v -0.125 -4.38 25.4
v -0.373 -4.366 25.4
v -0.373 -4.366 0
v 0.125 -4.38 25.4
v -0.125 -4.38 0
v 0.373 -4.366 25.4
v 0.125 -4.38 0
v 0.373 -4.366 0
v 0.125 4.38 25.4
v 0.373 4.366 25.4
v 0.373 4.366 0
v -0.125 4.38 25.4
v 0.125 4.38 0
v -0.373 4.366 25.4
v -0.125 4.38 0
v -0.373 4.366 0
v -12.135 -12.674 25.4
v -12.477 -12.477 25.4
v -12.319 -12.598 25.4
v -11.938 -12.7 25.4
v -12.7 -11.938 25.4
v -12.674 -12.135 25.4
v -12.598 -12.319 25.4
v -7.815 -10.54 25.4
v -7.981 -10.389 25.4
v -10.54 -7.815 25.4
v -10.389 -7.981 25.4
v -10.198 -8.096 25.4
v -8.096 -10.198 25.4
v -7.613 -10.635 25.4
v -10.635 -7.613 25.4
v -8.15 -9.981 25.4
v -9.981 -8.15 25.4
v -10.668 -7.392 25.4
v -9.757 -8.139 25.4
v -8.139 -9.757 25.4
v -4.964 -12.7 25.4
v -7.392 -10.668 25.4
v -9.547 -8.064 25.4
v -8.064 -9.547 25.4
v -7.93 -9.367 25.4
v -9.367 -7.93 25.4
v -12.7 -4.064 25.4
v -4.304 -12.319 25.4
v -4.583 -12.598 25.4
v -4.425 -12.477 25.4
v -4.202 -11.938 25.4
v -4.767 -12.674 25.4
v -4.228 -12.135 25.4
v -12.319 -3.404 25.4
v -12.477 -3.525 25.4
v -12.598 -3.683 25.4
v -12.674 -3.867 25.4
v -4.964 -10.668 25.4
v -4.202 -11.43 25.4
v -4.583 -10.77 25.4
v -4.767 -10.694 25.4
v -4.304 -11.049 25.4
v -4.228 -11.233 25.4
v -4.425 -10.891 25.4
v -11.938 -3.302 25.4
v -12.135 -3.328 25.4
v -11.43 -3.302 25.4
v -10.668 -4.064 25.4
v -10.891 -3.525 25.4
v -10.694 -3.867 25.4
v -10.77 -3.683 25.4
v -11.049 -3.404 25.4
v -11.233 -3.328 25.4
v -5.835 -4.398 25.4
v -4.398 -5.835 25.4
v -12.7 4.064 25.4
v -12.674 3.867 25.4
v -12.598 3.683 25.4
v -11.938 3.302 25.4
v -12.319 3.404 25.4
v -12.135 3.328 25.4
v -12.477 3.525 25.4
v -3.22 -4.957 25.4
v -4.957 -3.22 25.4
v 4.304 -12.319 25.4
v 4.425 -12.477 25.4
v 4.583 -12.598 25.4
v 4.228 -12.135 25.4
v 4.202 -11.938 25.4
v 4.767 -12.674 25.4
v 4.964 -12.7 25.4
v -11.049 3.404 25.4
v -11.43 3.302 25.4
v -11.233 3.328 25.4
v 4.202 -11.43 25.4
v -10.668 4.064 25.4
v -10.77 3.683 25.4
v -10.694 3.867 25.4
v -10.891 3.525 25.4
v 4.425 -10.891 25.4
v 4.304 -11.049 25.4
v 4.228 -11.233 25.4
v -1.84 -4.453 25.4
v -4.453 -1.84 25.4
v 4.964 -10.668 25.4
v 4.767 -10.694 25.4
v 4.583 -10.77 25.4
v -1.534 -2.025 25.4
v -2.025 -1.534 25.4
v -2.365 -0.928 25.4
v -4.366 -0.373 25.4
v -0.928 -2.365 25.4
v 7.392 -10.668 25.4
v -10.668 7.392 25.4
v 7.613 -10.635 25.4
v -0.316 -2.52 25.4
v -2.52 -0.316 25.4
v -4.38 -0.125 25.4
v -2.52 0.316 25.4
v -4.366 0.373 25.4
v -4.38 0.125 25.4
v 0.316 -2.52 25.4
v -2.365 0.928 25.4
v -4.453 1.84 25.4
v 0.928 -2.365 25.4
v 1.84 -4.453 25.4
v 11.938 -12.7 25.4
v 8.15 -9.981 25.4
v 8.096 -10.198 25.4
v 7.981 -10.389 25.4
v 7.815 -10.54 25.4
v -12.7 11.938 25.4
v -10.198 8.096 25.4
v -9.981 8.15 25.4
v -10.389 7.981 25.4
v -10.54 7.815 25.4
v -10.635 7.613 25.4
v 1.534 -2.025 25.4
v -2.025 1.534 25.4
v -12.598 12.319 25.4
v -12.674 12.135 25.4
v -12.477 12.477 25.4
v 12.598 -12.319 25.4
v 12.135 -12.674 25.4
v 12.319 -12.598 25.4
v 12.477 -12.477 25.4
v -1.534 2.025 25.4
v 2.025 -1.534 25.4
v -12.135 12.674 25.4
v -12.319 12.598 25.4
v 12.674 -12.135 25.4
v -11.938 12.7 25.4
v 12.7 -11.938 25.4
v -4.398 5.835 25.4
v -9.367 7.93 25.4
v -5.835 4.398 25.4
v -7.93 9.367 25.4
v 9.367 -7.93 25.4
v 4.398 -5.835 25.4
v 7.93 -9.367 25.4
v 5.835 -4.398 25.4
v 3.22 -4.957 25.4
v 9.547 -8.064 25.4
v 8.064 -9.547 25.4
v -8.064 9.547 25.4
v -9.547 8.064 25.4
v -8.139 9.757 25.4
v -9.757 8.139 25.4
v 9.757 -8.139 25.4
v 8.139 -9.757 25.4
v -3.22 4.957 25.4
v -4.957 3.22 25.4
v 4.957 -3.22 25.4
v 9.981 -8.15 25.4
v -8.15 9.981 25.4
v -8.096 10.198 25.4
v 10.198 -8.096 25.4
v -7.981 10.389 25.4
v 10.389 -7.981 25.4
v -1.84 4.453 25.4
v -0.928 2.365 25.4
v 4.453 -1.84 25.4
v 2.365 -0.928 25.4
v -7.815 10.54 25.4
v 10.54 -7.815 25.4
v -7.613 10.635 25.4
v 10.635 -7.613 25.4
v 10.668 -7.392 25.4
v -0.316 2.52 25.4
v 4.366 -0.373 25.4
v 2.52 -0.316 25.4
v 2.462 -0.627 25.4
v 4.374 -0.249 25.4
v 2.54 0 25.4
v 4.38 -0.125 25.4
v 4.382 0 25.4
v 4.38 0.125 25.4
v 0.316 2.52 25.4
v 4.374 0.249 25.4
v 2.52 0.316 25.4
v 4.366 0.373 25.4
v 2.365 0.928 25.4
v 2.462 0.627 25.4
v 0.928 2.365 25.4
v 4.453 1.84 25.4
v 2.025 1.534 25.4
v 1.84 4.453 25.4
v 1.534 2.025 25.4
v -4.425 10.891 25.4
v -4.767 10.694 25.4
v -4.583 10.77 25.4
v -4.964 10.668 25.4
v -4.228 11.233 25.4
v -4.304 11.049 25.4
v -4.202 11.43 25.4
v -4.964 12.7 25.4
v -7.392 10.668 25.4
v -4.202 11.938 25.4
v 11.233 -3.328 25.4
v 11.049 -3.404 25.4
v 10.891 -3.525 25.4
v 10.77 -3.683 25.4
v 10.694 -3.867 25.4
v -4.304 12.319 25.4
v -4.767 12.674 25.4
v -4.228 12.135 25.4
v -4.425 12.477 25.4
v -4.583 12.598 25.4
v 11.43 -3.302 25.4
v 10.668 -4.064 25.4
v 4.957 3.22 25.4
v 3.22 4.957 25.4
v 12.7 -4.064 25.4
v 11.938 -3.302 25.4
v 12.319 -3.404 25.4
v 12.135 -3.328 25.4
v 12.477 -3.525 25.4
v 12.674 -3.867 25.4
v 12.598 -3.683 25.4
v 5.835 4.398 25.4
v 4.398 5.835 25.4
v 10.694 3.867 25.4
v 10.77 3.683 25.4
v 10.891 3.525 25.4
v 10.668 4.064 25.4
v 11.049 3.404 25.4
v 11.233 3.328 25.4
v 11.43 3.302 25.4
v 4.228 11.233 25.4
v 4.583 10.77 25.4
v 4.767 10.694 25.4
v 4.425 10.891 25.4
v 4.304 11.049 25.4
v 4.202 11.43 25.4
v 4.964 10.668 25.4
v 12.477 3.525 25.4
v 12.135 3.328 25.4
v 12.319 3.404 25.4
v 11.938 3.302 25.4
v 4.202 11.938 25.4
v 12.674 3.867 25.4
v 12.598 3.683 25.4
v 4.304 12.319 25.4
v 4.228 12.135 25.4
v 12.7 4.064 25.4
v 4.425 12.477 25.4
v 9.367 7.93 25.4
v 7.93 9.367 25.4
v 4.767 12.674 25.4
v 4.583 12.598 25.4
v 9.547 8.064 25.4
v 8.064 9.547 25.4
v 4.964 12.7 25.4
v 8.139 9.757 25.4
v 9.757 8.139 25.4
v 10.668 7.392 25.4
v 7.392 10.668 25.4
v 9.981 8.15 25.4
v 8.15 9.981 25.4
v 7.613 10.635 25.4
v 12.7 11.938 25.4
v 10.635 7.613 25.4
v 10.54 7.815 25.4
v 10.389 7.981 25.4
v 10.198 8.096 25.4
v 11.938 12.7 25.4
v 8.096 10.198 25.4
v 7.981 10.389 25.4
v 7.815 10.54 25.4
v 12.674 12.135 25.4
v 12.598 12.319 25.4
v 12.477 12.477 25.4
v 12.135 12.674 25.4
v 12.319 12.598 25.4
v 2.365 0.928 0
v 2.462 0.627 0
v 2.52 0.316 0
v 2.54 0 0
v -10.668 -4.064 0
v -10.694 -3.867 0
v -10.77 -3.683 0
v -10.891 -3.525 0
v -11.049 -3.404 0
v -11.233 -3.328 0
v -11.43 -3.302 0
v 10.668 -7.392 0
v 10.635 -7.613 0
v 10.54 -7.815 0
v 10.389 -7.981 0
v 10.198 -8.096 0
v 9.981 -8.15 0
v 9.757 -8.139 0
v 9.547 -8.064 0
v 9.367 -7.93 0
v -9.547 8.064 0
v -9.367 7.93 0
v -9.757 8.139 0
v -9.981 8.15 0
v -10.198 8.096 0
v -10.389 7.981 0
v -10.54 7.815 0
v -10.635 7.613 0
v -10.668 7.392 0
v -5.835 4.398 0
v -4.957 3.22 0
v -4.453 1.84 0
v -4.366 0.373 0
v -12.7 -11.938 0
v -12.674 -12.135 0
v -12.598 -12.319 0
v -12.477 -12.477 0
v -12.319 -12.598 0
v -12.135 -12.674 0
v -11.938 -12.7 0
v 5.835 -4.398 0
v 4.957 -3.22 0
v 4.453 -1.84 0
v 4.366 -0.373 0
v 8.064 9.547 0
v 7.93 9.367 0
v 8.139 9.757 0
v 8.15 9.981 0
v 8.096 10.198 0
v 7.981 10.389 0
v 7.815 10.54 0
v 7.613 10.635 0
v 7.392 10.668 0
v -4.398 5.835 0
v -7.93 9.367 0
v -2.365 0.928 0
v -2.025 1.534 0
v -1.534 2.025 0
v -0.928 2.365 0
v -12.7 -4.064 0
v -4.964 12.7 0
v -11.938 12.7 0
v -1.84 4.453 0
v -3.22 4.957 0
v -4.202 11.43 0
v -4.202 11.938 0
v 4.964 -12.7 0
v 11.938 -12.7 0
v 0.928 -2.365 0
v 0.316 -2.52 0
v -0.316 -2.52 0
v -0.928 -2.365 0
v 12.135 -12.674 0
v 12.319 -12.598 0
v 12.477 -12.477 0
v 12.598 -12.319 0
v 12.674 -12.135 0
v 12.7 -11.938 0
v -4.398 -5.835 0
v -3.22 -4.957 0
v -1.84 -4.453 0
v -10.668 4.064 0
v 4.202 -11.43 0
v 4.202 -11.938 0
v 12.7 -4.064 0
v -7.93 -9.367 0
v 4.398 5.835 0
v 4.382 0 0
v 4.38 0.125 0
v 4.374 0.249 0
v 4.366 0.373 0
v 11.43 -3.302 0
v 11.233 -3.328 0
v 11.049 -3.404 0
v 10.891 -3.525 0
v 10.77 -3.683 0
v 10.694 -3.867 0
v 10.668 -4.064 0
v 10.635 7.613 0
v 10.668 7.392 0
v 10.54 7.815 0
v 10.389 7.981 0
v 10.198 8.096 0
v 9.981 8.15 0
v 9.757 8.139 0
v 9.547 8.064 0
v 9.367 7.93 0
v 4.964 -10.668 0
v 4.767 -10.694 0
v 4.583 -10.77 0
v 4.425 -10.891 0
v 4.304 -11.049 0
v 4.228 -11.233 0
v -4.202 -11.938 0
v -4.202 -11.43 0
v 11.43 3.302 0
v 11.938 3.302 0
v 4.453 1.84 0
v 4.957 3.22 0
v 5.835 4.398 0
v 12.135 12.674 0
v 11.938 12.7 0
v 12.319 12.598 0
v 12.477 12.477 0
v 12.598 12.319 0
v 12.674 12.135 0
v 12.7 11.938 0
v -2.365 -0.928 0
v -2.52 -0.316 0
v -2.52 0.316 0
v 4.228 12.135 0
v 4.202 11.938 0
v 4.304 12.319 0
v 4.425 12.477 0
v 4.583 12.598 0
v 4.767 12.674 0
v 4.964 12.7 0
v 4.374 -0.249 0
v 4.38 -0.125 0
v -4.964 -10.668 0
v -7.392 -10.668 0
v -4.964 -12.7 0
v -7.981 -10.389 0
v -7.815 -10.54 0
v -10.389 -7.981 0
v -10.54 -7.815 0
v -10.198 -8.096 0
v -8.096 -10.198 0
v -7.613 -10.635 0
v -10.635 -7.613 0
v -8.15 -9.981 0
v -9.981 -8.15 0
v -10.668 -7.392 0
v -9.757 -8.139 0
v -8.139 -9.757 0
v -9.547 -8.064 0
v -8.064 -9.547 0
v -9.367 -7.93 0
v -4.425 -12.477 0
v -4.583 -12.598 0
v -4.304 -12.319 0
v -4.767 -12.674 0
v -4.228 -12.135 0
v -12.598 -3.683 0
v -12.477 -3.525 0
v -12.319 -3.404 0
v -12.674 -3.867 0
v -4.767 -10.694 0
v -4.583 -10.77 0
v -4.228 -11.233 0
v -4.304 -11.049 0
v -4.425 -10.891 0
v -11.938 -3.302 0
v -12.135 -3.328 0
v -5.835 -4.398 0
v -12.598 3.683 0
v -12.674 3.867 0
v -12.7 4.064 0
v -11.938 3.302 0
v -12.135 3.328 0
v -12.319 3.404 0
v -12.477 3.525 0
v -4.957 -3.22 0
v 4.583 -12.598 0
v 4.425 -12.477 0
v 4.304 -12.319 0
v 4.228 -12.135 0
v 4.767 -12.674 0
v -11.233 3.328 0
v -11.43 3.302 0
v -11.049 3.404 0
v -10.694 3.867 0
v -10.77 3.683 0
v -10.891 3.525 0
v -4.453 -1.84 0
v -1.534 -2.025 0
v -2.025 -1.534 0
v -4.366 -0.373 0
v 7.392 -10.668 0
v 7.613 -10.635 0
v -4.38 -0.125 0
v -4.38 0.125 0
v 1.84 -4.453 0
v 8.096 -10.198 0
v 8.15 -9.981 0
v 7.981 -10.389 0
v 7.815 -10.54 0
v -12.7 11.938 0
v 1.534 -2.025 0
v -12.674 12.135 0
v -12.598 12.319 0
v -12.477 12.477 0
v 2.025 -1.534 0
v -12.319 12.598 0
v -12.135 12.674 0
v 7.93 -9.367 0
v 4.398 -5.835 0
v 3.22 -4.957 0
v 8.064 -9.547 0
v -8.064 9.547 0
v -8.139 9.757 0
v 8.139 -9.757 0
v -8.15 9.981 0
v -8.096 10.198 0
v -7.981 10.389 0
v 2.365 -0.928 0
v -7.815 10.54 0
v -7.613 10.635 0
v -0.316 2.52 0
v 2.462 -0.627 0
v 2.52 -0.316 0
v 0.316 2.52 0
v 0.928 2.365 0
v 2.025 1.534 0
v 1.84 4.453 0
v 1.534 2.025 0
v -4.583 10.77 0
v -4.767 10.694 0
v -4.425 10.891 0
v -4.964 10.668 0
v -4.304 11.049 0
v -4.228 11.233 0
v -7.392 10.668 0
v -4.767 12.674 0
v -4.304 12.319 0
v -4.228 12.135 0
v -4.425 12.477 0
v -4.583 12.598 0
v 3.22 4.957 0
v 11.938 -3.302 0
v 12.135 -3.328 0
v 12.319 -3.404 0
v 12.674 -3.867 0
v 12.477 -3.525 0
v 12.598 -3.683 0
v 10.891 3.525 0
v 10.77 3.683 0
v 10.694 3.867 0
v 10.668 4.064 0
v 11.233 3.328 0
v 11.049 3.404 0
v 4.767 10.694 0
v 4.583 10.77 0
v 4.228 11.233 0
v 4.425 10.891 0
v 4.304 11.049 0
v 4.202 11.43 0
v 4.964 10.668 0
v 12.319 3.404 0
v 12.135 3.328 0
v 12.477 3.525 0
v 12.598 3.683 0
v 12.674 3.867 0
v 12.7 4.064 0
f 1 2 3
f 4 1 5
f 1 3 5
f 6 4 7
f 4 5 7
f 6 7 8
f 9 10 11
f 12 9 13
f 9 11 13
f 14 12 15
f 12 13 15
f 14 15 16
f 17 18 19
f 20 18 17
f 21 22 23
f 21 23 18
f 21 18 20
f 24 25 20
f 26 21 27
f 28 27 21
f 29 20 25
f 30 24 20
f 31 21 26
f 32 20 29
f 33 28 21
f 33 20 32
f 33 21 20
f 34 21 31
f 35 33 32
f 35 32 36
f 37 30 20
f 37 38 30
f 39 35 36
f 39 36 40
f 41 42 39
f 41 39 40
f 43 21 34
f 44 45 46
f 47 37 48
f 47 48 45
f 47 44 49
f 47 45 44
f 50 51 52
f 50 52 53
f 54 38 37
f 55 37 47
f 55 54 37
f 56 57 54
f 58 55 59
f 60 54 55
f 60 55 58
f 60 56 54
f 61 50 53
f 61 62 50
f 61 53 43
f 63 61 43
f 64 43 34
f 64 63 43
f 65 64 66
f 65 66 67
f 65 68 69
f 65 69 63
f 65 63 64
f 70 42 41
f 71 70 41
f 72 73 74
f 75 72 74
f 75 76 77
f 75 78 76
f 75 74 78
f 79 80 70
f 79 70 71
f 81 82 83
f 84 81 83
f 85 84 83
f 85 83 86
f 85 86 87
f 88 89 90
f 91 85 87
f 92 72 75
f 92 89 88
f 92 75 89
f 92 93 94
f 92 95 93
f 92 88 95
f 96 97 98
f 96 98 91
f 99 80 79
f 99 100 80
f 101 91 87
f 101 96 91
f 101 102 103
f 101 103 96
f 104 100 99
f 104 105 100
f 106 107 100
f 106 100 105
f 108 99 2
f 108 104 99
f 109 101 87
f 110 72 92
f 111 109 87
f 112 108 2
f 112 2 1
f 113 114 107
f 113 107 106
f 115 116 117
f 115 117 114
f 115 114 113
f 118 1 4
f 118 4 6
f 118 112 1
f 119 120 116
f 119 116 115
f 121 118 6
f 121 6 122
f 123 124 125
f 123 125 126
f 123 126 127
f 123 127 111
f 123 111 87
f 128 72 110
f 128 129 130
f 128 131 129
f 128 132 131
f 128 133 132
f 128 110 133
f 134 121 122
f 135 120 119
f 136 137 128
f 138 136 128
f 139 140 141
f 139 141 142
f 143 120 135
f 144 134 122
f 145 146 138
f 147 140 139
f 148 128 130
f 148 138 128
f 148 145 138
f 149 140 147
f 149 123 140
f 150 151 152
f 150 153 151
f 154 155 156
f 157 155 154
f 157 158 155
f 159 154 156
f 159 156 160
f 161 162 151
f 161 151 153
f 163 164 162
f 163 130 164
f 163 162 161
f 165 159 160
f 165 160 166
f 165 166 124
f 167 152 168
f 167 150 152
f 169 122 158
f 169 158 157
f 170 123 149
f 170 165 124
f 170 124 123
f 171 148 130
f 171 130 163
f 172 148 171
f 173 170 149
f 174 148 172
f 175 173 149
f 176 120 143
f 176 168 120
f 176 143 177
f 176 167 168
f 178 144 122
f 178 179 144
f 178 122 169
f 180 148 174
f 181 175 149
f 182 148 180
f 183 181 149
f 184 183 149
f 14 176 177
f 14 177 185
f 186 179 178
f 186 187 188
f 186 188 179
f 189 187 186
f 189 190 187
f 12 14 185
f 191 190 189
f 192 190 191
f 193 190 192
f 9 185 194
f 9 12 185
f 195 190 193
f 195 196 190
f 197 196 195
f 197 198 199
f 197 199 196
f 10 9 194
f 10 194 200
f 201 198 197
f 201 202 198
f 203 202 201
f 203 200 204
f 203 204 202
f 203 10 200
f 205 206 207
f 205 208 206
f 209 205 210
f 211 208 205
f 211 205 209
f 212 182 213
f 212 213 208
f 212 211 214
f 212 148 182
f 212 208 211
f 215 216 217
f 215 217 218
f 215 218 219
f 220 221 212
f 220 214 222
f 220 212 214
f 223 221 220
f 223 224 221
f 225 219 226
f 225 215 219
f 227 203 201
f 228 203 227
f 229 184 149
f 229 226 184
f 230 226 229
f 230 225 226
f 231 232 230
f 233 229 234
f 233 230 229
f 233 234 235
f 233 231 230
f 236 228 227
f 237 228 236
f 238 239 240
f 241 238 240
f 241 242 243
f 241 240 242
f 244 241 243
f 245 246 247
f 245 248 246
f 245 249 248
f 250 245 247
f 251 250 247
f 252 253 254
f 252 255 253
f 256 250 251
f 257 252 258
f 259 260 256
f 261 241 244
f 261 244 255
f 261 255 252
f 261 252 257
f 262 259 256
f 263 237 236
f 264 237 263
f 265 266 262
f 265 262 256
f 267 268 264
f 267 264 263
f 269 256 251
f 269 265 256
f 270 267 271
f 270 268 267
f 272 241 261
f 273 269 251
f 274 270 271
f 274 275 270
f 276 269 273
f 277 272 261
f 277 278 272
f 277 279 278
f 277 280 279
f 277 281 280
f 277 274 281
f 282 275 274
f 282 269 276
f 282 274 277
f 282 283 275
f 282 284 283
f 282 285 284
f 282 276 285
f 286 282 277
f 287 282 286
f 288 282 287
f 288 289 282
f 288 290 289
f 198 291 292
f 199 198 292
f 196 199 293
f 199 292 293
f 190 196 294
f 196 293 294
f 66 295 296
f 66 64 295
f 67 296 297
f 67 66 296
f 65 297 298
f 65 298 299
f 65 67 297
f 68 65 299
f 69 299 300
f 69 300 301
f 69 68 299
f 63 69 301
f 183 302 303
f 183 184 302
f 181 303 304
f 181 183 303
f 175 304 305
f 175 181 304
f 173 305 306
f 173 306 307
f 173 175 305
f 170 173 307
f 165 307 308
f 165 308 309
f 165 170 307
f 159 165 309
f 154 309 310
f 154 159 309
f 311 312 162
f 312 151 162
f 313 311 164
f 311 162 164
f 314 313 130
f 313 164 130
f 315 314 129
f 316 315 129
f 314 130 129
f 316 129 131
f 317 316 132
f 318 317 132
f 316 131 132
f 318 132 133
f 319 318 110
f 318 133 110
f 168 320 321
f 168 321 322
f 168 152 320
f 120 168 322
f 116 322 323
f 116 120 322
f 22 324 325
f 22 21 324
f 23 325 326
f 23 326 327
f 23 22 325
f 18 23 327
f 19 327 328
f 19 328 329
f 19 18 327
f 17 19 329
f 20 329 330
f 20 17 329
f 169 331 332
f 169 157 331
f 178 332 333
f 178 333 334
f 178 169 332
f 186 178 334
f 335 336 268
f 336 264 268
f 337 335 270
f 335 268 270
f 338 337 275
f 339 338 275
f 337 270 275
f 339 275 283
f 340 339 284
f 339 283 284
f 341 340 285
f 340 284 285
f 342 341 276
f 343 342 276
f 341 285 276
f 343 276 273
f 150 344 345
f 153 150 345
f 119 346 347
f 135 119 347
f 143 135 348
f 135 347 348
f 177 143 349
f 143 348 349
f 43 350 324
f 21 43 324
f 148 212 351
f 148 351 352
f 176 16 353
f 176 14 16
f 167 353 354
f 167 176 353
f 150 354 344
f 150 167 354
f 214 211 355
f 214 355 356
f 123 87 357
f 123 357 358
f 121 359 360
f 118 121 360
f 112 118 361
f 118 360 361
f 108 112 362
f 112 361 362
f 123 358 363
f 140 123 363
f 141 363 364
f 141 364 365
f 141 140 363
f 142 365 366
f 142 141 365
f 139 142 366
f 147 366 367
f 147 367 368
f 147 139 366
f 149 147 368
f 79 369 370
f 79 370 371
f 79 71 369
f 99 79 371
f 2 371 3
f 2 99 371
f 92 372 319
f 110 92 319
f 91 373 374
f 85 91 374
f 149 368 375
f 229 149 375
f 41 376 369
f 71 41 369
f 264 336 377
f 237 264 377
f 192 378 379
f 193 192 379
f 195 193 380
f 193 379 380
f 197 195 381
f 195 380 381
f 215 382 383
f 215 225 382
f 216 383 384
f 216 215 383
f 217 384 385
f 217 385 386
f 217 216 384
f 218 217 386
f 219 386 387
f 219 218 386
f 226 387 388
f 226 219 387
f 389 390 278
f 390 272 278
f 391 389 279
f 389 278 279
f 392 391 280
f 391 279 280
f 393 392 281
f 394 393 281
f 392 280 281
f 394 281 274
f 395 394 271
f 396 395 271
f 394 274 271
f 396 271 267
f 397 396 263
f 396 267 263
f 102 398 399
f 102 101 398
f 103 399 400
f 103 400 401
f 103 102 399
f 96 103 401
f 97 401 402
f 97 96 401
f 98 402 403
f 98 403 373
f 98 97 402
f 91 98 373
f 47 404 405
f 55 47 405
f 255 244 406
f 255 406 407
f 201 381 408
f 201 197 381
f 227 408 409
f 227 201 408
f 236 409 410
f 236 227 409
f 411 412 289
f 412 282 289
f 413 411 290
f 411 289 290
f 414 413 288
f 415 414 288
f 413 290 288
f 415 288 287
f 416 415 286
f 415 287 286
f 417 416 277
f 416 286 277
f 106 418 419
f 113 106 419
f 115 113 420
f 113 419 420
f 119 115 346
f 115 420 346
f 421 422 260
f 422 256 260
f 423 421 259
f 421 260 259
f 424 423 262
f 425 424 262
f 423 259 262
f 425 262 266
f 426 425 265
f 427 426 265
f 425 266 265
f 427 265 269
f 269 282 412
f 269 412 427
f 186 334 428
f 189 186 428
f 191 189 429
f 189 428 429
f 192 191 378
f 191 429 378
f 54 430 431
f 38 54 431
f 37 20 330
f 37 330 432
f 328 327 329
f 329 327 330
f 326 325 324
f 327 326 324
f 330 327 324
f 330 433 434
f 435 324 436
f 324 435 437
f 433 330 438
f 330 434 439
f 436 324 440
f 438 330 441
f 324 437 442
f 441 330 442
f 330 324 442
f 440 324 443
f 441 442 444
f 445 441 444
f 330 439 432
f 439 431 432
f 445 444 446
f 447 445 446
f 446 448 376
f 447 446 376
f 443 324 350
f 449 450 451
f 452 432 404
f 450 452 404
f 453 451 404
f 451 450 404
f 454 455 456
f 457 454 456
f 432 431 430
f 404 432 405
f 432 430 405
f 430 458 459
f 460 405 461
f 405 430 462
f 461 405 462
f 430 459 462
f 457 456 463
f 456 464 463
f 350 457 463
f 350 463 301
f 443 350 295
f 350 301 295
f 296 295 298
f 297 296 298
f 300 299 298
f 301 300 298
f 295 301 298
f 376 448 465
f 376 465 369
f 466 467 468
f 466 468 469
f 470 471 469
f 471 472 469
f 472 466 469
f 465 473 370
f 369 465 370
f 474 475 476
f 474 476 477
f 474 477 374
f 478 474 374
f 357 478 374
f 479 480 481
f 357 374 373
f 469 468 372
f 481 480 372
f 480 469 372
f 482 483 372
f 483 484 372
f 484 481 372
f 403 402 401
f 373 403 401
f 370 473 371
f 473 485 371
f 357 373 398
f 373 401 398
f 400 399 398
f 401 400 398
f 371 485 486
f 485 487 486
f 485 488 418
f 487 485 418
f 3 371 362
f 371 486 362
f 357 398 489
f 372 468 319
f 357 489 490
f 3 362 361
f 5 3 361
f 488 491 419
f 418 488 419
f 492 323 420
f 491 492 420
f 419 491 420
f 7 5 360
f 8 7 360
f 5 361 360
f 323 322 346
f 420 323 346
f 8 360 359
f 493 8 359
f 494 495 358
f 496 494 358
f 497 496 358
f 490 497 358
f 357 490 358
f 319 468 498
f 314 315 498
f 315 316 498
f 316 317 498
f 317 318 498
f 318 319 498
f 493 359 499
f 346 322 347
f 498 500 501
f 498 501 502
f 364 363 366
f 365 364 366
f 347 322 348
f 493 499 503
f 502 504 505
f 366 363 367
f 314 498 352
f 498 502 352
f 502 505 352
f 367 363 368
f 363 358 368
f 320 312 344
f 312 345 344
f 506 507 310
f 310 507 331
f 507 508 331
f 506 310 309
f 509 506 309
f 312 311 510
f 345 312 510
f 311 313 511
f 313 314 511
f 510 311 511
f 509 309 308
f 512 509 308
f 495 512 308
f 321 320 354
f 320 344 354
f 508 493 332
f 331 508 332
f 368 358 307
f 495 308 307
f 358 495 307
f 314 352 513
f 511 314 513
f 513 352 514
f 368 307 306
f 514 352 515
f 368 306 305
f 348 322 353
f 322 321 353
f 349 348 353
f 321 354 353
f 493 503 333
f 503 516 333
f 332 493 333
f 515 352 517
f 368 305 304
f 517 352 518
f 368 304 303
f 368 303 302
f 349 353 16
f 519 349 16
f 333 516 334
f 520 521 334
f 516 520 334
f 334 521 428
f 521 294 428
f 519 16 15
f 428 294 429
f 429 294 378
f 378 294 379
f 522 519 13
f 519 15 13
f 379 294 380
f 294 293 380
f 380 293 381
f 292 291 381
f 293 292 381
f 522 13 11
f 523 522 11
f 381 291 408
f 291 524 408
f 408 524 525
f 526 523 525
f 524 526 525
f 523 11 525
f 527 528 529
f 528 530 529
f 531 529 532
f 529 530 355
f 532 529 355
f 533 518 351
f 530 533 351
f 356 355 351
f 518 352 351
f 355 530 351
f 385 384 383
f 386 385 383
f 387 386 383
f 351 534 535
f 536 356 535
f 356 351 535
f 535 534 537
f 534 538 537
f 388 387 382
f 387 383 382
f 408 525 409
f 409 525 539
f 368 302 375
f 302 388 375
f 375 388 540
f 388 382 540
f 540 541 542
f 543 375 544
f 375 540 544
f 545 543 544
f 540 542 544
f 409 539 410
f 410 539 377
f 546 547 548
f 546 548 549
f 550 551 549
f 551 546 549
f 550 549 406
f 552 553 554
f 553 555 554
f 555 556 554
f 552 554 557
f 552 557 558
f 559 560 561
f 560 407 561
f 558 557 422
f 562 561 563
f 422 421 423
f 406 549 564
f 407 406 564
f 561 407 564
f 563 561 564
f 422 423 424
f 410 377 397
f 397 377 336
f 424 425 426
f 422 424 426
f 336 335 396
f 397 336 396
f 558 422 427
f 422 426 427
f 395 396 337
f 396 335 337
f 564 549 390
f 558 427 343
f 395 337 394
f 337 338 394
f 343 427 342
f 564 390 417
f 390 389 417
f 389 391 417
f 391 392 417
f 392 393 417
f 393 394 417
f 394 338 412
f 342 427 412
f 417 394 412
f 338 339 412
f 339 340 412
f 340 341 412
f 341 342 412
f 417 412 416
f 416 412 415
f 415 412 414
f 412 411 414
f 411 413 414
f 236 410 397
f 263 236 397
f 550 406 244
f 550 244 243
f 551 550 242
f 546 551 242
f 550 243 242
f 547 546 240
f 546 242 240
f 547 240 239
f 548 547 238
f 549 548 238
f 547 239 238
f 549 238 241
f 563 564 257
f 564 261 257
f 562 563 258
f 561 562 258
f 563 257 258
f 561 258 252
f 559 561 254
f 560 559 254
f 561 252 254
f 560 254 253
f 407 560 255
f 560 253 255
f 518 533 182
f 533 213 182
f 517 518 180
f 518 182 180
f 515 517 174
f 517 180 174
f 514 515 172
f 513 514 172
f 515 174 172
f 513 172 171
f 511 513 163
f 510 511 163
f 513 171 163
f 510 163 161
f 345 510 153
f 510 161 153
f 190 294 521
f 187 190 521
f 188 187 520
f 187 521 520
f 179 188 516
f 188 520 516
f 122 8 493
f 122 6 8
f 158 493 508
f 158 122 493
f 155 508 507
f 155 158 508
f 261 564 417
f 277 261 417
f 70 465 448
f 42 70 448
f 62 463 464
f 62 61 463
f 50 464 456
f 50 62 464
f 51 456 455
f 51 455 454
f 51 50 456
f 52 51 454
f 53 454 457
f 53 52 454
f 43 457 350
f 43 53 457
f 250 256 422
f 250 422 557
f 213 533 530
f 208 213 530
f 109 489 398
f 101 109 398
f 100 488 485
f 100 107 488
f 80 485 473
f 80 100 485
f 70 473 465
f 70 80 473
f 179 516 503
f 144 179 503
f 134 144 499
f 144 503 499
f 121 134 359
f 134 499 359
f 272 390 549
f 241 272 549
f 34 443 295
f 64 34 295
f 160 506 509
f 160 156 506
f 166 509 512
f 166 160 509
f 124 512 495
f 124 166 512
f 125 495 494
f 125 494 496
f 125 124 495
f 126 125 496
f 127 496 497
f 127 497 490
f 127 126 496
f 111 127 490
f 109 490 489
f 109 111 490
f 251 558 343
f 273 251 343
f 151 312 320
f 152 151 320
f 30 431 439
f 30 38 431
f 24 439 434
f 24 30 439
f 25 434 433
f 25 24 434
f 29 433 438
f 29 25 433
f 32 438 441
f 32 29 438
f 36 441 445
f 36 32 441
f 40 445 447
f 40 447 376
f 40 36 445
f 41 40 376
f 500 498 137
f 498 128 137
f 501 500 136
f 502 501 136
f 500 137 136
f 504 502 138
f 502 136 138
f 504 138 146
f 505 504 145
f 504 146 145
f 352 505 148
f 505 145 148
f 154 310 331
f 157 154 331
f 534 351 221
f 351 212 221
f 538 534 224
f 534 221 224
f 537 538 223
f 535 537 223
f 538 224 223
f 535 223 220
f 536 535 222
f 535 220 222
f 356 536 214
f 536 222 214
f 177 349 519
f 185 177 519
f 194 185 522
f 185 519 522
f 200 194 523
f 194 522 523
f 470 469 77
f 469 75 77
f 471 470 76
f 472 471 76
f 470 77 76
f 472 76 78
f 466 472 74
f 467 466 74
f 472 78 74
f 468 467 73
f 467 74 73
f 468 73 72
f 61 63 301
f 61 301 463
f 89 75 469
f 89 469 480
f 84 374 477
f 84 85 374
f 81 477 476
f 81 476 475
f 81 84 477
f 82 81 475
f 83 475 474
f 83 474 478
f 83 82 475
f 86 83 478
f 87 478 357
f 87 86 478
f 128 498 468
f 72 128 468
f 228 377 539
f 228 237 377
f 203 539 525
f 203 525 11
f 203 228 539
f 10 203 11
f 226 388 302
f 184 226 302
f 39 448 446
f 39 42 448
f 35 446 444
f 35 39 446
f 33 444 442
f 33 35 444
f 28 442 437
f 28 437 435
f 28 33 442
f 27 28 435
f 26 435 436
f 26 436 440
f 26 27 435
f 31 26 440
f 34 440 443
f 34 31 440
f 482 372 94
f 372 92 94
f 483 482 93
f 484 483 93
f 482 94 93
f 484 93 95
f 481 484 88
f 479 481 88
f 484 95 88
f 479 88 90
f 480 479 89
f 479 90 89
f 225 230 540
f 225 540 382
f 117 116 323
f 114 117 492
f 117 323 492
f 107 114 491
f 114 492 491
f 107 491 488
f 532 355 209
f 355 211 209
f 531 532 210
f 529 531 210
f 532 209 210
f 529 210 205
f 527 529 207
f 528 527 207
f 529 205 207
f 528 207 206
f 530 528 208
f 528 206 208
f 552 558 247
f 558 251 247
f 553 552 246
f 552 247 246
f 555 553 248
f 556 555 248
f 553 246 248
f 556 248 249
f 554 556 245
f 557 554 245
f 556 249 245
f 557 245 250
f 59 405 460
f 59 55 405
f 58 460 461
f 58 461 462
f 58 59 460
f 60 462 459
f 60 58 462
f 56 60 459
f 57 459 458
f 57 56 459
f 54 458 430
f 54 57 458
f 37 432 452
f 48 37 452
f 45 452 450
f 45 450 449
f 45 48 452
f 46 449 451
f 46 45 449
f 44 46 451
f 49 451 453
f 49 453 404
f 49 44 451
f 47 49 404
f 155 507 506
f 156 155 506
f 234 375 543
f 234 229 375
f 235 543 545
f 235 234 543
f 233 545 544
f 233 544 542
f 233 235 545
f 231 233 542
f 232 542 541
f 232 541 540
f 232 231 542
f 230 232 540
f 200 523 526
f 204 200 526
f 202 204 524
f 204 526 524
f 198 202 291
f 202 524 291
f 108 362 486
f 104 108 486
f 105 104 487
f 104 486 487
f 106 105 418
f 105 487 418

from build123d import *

# Parameters (mm, degrees)
F1_DEPTH = 25.4
F2_R     = 5.08
F3_R     = 0.762


with BuildPart() as f1:
    # F0 (on Top) → F1 (new body)
    with BuildSketch(Plane.XY):
        Polygon((-11.2631590206, 12.7), (-9.2311590206, 10.668), (-4.2022368871, 10.668), (-4.2022368871, 12.7), align=None)
        Polygon((-12.7, 11.2631590206), (-10.668, 9.2311590206), (-10.668, 10.668), (-9.2311590206, 10.668), (-11.2631590206, 12.7), (-12.7, 12.7), align=None)
        Polygon((-10.668, 3.302), (-10.668, 9.2311590206), (-12.7, 11.2631590206), (-12.7, 3.302), align=None)
        Polygon((-12.7, -3.302), (-12.7, -11.2631590206), (-10.668, -9.2311590206), (-10.668, -3.302), align=None)
        Polygon((-12.7, -12.7), (-11.2631590206, -12.7), (-9.2311590206, -10.668), (-10.668, -10.668), (-10.668, -9.2311590206), (-12.7, -11.2631590206), align=None)
        Polygon((-11.2631590206, -12.7), (-4.2022368871, -12.7), (-4.2022368871, -10.668), (-9.2311590206, -10.668), align=None)
        Polygon((4.2022368871, -12.7), (11.2631590206, -12.7), (9.2311590206, -10.668), (4.2022368871, -10.668), align=None)
        Polygon((11.2631590206, -12.7), (12.7, -12.7), (12.7, -11.2631590206), (10.668, -9.2311590206), (10.668, -10.668), (9.2311590206, -10.668), align=None)
        Polygon((10.668, -9.2311590206), (12.7, -11.2631590206), (12.7, -3.302), (10.668, -3.302), align=None)
        Polygon((10.668, 3.302), (12.7, 3.302), (12.7, 11.2631590206), (10.668, 9.2311590206), align=None)
        Polygon((10.668, 9.2311590206), (12.7, 11.2631590206), (12.7, 12.7), (11.2631590206, 12.7), (9.2311590206, 10.668), (10.668, 10.668), align=None)
        Polygon((9.2311590206, 10.668), (11.2631590206, 12.7), (4.2022368871, 12.7), (4.2022368871, 10.668), align=None)
        with BuildLine():
            Line((-10.668, 9.2311590206), (-3.7321628684, 2.295321889))
            ThreePointArc((-3.7321628684, 2.295321889), (-3.0981883618, 3.0981883618), (-2.295321889, 3.7321628684))
            Line((-2.295321889, 3.7321628684), (-9.2311590206, 10.668))
            Line((-9.2311590206, 10.668), (-10.668, 10.668))
            Line((-10.668, 10.668), (-10.668, 9.2311590206))
        make_face()
        with BuildLine():
            Line((3.7321628684, 2.295321889), (10.668, 9.2311590206))
            Line((10.668, 9.2311590206), (10.668, 10.668))
            Line((10.668, 10.668), (9.2311590206, 10.668))
            Line((9.2311590206, 10.668), (2.295321889, 3.7321628684))
            ThreePointArc((2.295321889, 3.7321628684), (3.0981883618, 3.0981883618), (3.7321628684, 2.295321889))
        make_face()
        with BuildLine():
            Line((-9.2311590206, -10.668), (-2.295321889, -3.7321628684))
            ThreePointArc((-2.295321889, -3.7321628684), (-3.0981883618, -3.0981883618), (-3.7321628684, -2.295321889))
            Line((-3.7321628684, -2.295321889), (-10.668, -9.2311590206))
            Line((-10.668, -9.2311590206), (-10.668, -10.668))
            Line((-10.668, -10.668), (-9.2311590206, -10.668))
        make_face()
        with BuildLine():
            Line((2.295321889, -3.7321628684), (9.2311590206, -10.668))
            Line((9.2311590206, -10.668), (10.668, -10.668))
            Line((10.668, -10.668), (10.668, -9.2311590206))
            Line((10.668, -9.2311590206), (3.7321628684, -2.295321889))
            ThreePointArc((3.7321628684, -2.295321889), (3.0981883618, -3.0981883618), (2.295321889, -3.7321628684))
        make_face()
        with BuildLine():
            Line((0.9276876477, 2.3645286271), (2.295321889, 3.7321628684))
            ThreePointArc((2.295321889, 3.7321628684), (0, 4.3815), (-2.295321889, 3.7321628684))
            Line((-2.295321889, 3.7321628684), (-0.9276876477, 2.3645286271))
            ThreePointArc((-0.9276876477, 2.3645286271), (0, 2.54), (0.9276876477, 2.3645286271))
        make_face()
        with BuildLine():
            ThreePointArc((-2.295321889, 3.7321628684), (-3.0981883618, 3.0981883618), (-3.7321628684, 2.295321889))
            Line((-3.7321628684, 2.295321889), (-2.3645286271, 0.9276876477))
            ThreePointArc((-2.3645286271, 0.9276876477), (-1.7960512242, 1.7960512242), (-0.9276876477, 2.3645286271))
            Line((-0.9276876477, 2.3645286271), (-2.295321889, 3.7321628684))
        make_face()
        with BuildLine():
            ThreePointArc((-3.7321628684, 2.295321889), (-4.3815, 0), (-3.7321628684, -2.295321889))
            Line((-3.7321628684, -2.295321889), (-2.3645286271, -0.9276876477))
            ThreePointArc((-2.3645286271, -0.9276876477), (-2.54, 0), (-2.3645286271, 0.9276876477))
            Line((-2.3645286271, 0.9276876477), (-3.7321628684, 2.295321889))
        make_face()
        with BuildLine():
            ThreePointArc((-3.7321628684, -2.295321889), (-3.0981883618, -3.0981883618), (-2.295321889, -3.7321628684))
            Line((-2.295321889, -3.7321628684), (-0.9276876477, -2.3645286271))
            ThreePointArc((-0.9276876477, -2.3645286271), (-1.7960512242, -1.7960512242), (-2.3645286271, -0.9276876477))
            Line((-2.3645286271, -0.9276876477), (-3.7321628684, -2.295321889))
        make_face()
        with BuildLine():
            ThreePointArc((-2.295321889, -3.7321628684), (0, -4.3815), (2.295321889, -3.7321628684))
            Line((2.295321889, -3.7321628684), (0.9276876477, -2.3645286271))
            ThreePointArc((0.9276876477, -2.3645286271), (0, -2.54), (-0.9276876477, -2.3645286271))
            Line((-0.9276876477, -2.3645286271), (-2.295321889, -3.7321628684))
        make_face()
        with BuildLine():
            Line((2.3645286271, 0.9276876477), (3.7321628684, 2.295321889))
            ThreePointArc((3.7321628684, 2.295321889), (3.0981883618, 3.0981883618), (2.295321889, 3.7321628684))
            Line((2.295321889, 3.7321628684), (0.9276876477, 2.3645286271))
            ThreePointArc((0.9276876477, 2.3645286271), (1.7960512242, 1.7960512242), (2.3645286271, 0.9276876477))
        make_face()
        with BuildLine():
            Line((2.3645286271, -0.9276876477), (3.7321628684, -2.295321889))
            ThreePointArc((3.7321628684, -2.295321889), (4.2160416185, -1.1927008515), (4.3815, 0))
            ThreePointArc((4.3815, 0), (4.2160416185, 1.1927008515), (3.7321628684, 2.295321889))
            Line((3.7321628684, 2.295321889), (2.3645286271, 0.9276876477))
            ThreePointArc((2.3645286271, 0.9276876477), (2.4957466531, 0.4720684734), (2.54, 0))
            ThreePointArc((2.54, 0), (2.4957466531, -0.4720684734), (2.3645286271, -0.9276876477))
        make_face()
        with BuildLine():
            Line((0.9276876477, -2.3645286271), (2.295321889, -3.7321628684))
            ThreePointArc((2.295321889, -3.7321628684), (3.0981883618, -3.0981883618), (3.7321628684, -2.295321889))
            Line((3.7321628684, -2.295321889), (2.3645286271, -0.9276876477))
            ThreePointArc((2.3645286271, -0.9276876477), (1.7960512242, -1.7960512242), (0.9276876477, -2.3645286271))
        make_face()
    extrude(amount=F1_DEPTH)

    # F2
    f2_edges = [f1.edges().sort_by_distance(p)[0] for p in [
        (-3.732163, 2.295322, 12.7),
        (-3.732163, -2.295322, 12.7),
        (-2.295322, 3.732163, 12.7),
        (2.295322, 3.732163, 12.7),
        (-2.295322, -3.732163, 12.7),
        (2.295322, -3.732163, 12.7),
        (3.732163, -2.295322, 12.7),
        (3.732163, 2.295322, 12.7),
    ]]
    fillet(f2_edges, radius=F2_R)

    # F3
    f3_edges = [f1.edges().sort_by_distance(p)[0] for p in [
        (9.231159, 10.668, 12.7),
        (10.668, 9.231159, 12.7),
        (-9.231159, 10.668, 12.7),
        (-10.668, 9.231159, 12.7),
        (10.668, -9.231159, 12.7),
        (9.231159, -10.668, 12.7),
        (-9.231159, -10.668, 12.7),
        (-10.668, -9.231159, 12.7),
        (-12.7, 12.7, 12.7),
        (12.7, 12.7, 12.7),
        (12.7, -12.7, 12.7),
        (-12.7, -12.7, 12.7),
        (12.7, 3.302, 12.7),
        (10.668, 3.302, 12.7),
        (4.202237, 10.668, 12.7),
        (4.202237, 12.7, 12.7),
        (-4.202237, 12.7, 12.7),
        (-4.202237, 10.668, 12.7),
        (-10.668, 3.302, 12.7),
        (-12.7, 3.302, 12.7),
        (-10.668, -3.302, 12.7),
        (-12.7, -3.302, 12.7),
        (4.202237, -10.668, 12.7),
        (4.202237, -12.7, 12.7),
        (10.668, -3.302, 12.7),
        (12.7, -3.302, 12.7),
        (-4.202237, -12.7, 12.7),
        (-4.202237, -10.668, 12.7),
    ]]
    fillet(f3_edges, radius=F3_R)


solid = f1.part
